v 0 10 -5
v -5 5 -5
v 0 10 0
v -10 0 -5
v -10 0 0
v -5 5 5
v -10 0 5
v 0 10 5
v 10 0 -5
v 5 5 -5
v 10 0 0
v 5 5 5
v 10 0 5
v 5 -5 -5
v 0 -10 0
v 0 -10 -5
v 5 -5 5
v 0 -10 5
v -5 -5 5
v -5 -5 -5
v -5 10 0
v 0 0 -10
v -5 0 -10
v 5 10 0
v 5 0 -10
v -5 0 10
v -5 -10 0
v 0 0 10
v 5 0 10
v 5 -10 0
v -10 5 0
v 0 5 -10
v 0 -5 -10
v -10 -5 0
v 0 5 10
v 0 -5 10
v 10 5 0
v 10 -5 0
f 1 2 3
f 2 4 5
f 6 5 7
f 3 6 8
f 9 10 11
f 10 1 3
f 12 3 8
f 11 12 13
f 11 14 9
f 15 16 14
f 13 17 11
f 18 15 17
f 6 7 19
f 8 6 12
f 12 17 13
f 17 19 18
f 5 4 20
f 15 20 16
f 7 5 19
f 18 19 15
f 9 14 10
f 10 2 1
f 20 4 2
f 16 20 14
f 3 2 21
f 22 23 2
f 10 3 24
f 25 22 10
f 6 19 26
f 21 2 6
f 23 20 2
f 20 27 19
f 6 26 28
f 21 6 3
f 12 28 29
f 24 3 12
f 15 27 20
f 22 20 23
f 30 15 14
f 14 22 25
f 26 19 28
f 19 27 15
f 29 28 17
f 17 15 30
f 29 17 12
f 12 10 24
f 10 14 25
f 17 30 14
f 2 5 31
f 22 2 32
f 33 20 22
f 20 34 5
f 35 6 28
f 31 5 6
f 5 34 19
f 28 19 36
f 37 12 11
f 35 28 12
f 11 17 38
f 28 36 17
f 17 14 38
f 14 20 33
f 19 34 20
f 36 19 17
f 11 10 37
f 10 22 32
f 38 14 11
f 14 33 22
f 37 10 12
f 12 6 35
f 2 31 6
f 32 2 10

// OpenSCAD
  render (convexity = 2) union () {
 cylinder(10,10,10,$fn=4, center=true);
 
rotate ([0,90,0]) 
 cylinder(10,10,10,$fn=4, center=true); 
 
 rotate ([0,-180,0])
 cylinder(10,10,10,$fn=4, center=true);
 
 rotate ([90,0,90])
 cylinder(10,10,10,$fn=4, center=true);
 
 rotate ([270,0,270])
 cylinder(10,10,10,$fn=4, center=true);
 
 rotate ([0,90,90])   
 cylinder(10,10,10,$fn=4, center=true);
  
 rotate ([270,270,270])    
  cylinder(10,10,10,$fn=4, center=true);

cylinder(10,10,00,$fn=4, center=true);
  
  rotate ([0,180,0])
  cylinder(10,10,00,$fn=4, center=true);
  
  rotate ([90,0,0])
  cylinder(10,10,00,$fn=4, center=true);
  
  rotate ([270,0,0])
  cylinder(10,10,00,$fn=4, center=true);
}
